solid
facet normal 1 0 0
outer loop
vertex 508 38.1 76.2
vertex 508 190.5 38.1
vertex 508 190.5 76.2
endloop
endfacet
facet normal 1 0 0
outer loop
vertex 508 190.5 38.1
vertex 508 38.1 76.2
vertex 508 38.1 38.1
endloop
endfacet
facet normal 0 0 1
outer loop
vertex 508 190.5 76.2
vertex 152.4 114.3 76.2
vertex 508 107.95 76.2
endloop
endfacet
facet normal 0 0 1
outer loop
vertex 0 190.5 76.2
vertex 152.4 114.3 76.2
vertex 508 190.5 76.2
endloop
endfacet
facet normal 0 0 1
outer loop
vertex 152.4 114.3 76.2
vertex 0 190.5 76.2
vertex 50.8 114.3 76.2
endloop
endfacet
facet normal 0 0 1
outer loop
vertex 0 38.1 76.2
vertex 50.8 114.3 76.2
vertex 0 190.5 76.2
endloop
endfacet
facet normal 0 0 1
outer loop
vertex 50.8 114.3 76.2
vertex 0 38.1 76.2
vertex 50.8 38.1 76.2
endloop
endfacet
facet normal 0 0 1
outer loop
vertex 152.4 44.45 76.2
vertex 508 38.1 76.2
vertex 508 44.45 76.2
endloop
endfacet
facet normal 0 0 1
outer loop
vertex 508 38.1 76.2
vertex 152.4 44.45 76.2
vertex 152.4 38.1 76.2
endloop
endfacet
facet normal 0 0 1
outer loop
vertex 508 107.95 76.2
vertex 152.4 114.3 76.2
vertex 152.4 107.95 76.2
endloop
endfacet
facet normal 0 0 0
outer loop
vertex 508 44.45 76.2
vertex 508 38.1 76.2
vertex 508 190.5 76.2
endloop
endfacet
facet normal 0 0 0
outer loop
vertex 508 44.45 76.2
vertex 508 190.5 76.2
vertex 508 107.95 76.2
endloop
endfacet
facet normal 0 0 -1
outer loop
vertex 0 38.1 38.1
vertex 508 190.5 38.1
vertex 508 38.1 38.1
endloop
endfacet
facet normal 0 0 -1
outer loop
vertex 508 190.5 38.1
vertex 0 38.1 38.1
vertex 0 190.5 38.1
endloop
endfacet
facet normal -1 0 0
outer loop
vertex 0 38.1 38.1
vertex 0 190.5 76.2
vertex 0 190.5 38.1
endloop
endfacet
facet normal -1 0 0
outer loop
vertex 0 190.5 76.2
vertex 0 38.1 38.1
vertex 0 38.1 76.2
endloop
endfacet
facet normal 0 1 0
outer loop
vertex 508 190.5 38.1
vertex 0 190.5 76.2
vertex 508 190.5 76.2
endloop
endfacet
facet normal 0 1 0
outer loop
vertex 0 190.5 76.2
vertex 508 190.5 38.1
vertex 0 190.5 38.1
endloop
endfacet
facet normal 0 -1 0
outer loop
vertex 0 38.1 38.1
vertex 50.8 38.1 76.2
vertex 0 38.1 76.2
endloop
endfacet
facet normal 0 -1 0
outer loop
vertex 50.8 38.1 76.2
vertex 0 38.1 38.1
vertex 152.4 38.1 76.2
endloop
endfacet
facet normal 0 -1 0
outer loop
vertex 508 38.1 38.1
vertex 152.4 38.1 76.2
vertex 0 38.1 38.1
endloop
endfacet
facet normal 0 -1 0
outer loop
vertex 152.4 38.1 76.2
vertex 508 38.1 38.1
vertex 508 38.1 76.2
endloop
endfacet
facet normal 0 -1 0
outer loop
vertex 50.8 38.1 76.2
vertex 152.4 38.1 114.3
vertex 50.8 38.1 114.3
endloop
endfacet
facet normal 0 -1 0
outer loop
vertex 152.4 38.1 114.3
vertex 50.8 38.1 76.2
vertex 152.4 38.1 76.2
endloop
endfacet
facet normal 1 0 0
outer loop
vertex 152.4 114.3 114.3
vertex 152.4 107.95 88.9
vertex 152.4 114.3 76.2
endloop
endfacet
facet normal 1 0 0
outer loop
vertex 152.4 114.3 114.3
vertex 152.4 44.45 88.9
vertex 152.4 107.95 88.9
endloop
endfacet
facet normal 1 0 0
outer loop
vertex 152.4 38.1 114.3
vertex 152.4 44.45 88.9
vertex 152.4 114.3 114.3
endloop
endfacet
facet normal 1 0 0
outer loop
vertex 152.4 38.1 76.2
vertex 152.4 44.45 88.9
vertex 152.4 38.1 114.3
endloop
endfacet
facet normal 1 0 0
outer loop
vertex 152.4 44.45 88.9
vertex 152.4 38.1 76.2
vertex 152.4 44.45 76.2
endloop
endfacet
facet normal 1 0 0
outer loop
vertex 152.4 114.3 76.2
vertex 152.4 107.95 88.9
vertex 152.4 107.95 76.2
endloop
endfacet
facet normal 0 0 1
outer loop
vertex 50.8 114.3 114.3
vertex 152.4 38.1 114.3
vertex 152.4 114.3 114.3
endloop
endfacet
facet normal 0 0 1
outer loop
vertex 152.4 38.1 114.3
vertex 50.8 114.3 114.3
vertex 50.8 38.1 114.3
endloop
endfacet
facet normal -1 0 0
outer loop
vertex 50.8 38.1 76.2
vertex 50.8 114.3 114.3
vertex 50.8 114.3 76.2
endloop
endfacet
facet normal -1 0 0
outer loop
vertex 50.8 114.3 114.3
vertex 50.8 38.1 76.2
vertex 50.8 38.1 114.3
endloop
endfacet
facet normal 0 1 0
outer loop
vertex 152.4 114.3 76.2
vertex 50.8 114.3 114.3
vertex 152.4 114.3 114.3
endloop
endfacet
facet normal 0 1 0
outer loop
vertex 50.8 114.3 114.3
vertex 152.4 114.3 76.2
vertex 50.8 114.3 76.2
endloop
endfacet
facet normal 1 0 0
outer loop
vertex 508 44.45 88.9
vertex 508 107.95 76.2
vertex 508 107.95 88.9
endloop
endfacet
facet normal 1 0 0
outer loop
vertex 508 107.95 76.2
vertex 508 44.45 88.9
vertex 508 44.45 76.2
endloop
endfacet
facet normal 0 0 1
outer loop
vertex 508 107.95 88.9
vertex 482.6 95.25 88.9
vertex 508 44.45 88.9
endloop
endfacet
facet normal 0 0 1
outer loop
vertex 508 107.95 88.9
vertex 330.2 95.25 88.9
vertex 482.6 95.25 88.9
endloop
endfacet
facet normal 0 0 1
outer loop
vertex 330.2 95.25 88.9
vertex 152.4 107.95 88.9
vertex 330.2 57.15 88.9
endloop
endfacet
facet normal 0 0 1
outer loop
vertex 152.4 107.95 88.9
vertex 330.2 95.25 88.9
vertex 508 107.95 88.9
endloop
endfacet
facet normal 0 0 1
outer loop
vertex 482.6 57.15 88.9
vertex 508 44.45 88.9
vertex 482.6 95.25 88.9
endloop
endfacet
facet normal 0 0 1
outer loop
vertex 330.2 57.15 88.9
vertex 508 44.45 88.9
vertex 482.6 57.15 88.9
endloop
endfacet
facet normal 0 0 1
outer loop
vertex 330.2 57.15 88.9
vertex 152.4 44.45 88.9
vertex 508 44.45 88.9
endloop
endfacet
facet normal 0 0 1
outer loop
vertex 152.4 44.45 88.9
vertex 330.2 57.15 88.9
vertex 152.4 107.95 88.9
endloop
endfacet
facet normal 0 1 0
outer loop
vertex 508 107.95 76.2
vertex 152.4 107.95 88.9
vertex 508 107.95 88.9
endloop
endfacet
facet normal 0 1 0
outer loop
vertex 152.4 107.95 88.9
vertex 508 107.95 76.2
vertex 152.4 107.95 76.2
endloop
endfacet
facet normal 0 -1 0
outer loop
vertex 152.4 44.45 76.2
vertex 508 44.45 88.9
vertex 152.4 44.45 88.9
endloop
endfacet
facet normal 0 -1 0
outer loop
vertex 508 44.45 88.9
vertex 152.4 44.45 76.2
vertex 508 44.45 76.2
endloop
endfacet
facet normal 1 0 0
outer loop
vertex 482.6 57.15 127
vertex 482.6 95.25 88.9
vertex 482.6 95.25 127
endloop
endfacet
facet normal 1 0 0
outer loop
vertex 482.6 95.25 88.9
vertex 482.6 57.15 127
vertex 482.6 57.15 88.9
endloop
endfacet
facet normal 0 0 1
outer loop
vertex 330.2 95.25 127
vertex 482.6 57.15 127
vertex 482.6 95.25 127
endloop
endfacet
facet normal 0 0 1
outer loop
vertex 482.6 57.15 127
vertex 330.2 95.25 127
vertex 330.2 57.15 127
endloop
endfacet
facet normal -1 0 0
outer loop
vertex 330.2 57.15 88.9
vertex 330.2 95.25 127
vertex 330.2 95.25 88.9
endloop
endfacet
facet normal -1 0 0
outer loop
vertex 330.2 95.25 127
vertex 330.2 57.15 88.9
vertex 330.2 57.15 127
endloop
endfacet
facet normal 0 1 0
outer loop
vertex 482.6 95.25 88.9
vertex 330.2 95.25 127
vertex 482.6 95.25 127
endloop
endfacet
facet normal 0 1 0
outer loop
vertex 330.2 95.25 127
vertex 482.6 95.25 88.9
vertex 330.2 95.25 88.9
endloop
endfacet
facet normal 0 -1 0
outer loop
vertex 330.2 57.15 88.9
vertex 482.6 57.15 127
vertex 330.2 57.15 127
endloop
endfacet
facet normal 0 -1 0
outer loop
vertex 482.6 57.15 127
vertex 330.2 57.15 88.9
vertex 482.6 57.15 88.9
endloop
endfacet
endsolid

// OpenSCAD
// Daxophone — tongue / dax-blank bounding ENVELOPE ONLY
// SPDX-License-Identifier: CC-BY-4.0
//
// Source of truth: no design table (xlsx) or measured reference exists for
// this instrument yet (see ../design.md, ../decision-record.md). Every
// dimension below is an `assumption` bounding-envelope placeholder for
// bench-planning layout, NOT a released tongue, clamp, or dax-block spec.
//
// Authority: pending_measurement. NOT fabrication authority until reviewed
// against a measured reference or design table (see
// ../visual-output-register.csv, ../cad/mcp-session-log.md).
//
// EXPLICITLY OUT OF SCOPE (per design.md subsystem gates — hand-refined,
// tuning-sensitive regions this envelope does not model):
//   - tongue outline, thickness profile, grain orientation, edge finish
//   - dax-block face contour / contact curve ("fret map")
//   - clamp jaw pressure/geometry and resulting buzz/damage behavior
//   - contact pickup placement and playable pitch behavior
// This file models only the bounding blanks (tongue coupon, clamp block, dax
// block) as rectangular stock envelopes so a builder can block out bench
// space and coupon stock before any of the above is measured.

// ---- Parameters (all `assumption`, bounding-envelope only) ----
tongue_blank_len_in   = 14;   // assumption: coupon stock bounding length, design.md CL-001 (pending_measurement)
tongue_blank_w_in     = 2.5;  // assumption: coupon stock bounding width, design.md CL-001 (pending_measurement)
tongue_blank_th_in    = 0.5;  // assumption: coupon stock bounding thickness, design.md CL-001 (pending_measurement)
clamp_block_len_in    = 4;    // assumption: clamp jaw coupon bounding length, design.md CL-003 (pending_measurement)
clamp_block_w_in      = 3;    // assumption: clamp jaw coupon bounding width, design.md CL-003 (pending_measurement)
clamp_block_h_in      = 3;    // assumption: clamp jaw coupon bounding height, design.md CL-003 (pending_measurement)
dax_block_len_in      = 6;    // assumption: hand-held dax block bounding length, design.md CL-005 (pending_measurement)
dax_block_w_in        = 1.5;  // assumption: hand-held dax block bounding width, design.md CL-005 (pending_measurement)
dax_block_h_in        = 1.5;  // assumption: hand-held dax block bounding height, design.md CL-005 (pending_measurement)
base_len_in           = 20;   // assumption: bench base support bounding length, design.md CL-006 (pending_measurement)
base_w_in             = 6;    // assumption: bench base support bounding width, design.md CL-006 (pending_measurement)
base_h_in             = 1.5;  // assumption: bench base support bounding height, design.md CL-006 (pending_measurement)
clamp_offset_in       = 2;    // assumption: how far the clamp sits from the tongue free end, bench-planning only

in = 25.4; // mm per inch

// ---- Modules ----

// Bench base support (bounding box only)
module base_envelope() {
    cube([base_len_in * in, base_w_in * in, base_h_in * in], center = false);
}

// Clamp block coupon (bounding box; holds one end of the tongue blank)
module clamp_envelope() {
    cube([clamp_block_len_in * in, clamp_block_w_in * in, clamp_block_h_in * in], center = false);
}

// Tongue blank coupon (bounding box; cantilevered off the clamp block)
module tongue_envelope() {
    cube([tongue_blank_len_in * in, tongue_blank_w_in * in, tongue_blank_th_in * in], center = false);
}

// Hand-held dax block (bounding box shown near mid-tongue for layout reference only)
module dax_block_envelope() {
    cube([dax_block_len_in * in, dax_block_w_in * in, dax_block_h_in * in], center = false);
}

// ---- Top-level assembly ----
module daxophone_envelope() {
    color("SaddleBrown") translate([0, (base_w_in - clamp_block_w_in) / 2 * in, base_h_in * in])
        base_envelope();
    color("SlateGray") translate([clamp_offset_in * in, (base_w_in - clamp_block_w_in) / 2 * in, base_h_in * in])
        clamp_envelope();
    color("BurlyWood") translate([(clamp_offset_in + clamp_block_len_in) * in,
                                   (base_w_in - tongue_blank_w_in) / 2 * in,
                                   (base_h_in + clamp_block_h_in / 2) * in])
        tongue_envelope();
    color("Chocolate") translate([(clamp_offset_in + clamp_block_len_in + tongue_blank_len_in / 2) * in,
                                   (base_w_in - dax_block_w_in) / 2 * in,
                                   (base_h_in + clamp_block_h_in / 2 + tongue_blank_th_in) * in])
        dax_block_envelope();
}

daxophone_envelope();
